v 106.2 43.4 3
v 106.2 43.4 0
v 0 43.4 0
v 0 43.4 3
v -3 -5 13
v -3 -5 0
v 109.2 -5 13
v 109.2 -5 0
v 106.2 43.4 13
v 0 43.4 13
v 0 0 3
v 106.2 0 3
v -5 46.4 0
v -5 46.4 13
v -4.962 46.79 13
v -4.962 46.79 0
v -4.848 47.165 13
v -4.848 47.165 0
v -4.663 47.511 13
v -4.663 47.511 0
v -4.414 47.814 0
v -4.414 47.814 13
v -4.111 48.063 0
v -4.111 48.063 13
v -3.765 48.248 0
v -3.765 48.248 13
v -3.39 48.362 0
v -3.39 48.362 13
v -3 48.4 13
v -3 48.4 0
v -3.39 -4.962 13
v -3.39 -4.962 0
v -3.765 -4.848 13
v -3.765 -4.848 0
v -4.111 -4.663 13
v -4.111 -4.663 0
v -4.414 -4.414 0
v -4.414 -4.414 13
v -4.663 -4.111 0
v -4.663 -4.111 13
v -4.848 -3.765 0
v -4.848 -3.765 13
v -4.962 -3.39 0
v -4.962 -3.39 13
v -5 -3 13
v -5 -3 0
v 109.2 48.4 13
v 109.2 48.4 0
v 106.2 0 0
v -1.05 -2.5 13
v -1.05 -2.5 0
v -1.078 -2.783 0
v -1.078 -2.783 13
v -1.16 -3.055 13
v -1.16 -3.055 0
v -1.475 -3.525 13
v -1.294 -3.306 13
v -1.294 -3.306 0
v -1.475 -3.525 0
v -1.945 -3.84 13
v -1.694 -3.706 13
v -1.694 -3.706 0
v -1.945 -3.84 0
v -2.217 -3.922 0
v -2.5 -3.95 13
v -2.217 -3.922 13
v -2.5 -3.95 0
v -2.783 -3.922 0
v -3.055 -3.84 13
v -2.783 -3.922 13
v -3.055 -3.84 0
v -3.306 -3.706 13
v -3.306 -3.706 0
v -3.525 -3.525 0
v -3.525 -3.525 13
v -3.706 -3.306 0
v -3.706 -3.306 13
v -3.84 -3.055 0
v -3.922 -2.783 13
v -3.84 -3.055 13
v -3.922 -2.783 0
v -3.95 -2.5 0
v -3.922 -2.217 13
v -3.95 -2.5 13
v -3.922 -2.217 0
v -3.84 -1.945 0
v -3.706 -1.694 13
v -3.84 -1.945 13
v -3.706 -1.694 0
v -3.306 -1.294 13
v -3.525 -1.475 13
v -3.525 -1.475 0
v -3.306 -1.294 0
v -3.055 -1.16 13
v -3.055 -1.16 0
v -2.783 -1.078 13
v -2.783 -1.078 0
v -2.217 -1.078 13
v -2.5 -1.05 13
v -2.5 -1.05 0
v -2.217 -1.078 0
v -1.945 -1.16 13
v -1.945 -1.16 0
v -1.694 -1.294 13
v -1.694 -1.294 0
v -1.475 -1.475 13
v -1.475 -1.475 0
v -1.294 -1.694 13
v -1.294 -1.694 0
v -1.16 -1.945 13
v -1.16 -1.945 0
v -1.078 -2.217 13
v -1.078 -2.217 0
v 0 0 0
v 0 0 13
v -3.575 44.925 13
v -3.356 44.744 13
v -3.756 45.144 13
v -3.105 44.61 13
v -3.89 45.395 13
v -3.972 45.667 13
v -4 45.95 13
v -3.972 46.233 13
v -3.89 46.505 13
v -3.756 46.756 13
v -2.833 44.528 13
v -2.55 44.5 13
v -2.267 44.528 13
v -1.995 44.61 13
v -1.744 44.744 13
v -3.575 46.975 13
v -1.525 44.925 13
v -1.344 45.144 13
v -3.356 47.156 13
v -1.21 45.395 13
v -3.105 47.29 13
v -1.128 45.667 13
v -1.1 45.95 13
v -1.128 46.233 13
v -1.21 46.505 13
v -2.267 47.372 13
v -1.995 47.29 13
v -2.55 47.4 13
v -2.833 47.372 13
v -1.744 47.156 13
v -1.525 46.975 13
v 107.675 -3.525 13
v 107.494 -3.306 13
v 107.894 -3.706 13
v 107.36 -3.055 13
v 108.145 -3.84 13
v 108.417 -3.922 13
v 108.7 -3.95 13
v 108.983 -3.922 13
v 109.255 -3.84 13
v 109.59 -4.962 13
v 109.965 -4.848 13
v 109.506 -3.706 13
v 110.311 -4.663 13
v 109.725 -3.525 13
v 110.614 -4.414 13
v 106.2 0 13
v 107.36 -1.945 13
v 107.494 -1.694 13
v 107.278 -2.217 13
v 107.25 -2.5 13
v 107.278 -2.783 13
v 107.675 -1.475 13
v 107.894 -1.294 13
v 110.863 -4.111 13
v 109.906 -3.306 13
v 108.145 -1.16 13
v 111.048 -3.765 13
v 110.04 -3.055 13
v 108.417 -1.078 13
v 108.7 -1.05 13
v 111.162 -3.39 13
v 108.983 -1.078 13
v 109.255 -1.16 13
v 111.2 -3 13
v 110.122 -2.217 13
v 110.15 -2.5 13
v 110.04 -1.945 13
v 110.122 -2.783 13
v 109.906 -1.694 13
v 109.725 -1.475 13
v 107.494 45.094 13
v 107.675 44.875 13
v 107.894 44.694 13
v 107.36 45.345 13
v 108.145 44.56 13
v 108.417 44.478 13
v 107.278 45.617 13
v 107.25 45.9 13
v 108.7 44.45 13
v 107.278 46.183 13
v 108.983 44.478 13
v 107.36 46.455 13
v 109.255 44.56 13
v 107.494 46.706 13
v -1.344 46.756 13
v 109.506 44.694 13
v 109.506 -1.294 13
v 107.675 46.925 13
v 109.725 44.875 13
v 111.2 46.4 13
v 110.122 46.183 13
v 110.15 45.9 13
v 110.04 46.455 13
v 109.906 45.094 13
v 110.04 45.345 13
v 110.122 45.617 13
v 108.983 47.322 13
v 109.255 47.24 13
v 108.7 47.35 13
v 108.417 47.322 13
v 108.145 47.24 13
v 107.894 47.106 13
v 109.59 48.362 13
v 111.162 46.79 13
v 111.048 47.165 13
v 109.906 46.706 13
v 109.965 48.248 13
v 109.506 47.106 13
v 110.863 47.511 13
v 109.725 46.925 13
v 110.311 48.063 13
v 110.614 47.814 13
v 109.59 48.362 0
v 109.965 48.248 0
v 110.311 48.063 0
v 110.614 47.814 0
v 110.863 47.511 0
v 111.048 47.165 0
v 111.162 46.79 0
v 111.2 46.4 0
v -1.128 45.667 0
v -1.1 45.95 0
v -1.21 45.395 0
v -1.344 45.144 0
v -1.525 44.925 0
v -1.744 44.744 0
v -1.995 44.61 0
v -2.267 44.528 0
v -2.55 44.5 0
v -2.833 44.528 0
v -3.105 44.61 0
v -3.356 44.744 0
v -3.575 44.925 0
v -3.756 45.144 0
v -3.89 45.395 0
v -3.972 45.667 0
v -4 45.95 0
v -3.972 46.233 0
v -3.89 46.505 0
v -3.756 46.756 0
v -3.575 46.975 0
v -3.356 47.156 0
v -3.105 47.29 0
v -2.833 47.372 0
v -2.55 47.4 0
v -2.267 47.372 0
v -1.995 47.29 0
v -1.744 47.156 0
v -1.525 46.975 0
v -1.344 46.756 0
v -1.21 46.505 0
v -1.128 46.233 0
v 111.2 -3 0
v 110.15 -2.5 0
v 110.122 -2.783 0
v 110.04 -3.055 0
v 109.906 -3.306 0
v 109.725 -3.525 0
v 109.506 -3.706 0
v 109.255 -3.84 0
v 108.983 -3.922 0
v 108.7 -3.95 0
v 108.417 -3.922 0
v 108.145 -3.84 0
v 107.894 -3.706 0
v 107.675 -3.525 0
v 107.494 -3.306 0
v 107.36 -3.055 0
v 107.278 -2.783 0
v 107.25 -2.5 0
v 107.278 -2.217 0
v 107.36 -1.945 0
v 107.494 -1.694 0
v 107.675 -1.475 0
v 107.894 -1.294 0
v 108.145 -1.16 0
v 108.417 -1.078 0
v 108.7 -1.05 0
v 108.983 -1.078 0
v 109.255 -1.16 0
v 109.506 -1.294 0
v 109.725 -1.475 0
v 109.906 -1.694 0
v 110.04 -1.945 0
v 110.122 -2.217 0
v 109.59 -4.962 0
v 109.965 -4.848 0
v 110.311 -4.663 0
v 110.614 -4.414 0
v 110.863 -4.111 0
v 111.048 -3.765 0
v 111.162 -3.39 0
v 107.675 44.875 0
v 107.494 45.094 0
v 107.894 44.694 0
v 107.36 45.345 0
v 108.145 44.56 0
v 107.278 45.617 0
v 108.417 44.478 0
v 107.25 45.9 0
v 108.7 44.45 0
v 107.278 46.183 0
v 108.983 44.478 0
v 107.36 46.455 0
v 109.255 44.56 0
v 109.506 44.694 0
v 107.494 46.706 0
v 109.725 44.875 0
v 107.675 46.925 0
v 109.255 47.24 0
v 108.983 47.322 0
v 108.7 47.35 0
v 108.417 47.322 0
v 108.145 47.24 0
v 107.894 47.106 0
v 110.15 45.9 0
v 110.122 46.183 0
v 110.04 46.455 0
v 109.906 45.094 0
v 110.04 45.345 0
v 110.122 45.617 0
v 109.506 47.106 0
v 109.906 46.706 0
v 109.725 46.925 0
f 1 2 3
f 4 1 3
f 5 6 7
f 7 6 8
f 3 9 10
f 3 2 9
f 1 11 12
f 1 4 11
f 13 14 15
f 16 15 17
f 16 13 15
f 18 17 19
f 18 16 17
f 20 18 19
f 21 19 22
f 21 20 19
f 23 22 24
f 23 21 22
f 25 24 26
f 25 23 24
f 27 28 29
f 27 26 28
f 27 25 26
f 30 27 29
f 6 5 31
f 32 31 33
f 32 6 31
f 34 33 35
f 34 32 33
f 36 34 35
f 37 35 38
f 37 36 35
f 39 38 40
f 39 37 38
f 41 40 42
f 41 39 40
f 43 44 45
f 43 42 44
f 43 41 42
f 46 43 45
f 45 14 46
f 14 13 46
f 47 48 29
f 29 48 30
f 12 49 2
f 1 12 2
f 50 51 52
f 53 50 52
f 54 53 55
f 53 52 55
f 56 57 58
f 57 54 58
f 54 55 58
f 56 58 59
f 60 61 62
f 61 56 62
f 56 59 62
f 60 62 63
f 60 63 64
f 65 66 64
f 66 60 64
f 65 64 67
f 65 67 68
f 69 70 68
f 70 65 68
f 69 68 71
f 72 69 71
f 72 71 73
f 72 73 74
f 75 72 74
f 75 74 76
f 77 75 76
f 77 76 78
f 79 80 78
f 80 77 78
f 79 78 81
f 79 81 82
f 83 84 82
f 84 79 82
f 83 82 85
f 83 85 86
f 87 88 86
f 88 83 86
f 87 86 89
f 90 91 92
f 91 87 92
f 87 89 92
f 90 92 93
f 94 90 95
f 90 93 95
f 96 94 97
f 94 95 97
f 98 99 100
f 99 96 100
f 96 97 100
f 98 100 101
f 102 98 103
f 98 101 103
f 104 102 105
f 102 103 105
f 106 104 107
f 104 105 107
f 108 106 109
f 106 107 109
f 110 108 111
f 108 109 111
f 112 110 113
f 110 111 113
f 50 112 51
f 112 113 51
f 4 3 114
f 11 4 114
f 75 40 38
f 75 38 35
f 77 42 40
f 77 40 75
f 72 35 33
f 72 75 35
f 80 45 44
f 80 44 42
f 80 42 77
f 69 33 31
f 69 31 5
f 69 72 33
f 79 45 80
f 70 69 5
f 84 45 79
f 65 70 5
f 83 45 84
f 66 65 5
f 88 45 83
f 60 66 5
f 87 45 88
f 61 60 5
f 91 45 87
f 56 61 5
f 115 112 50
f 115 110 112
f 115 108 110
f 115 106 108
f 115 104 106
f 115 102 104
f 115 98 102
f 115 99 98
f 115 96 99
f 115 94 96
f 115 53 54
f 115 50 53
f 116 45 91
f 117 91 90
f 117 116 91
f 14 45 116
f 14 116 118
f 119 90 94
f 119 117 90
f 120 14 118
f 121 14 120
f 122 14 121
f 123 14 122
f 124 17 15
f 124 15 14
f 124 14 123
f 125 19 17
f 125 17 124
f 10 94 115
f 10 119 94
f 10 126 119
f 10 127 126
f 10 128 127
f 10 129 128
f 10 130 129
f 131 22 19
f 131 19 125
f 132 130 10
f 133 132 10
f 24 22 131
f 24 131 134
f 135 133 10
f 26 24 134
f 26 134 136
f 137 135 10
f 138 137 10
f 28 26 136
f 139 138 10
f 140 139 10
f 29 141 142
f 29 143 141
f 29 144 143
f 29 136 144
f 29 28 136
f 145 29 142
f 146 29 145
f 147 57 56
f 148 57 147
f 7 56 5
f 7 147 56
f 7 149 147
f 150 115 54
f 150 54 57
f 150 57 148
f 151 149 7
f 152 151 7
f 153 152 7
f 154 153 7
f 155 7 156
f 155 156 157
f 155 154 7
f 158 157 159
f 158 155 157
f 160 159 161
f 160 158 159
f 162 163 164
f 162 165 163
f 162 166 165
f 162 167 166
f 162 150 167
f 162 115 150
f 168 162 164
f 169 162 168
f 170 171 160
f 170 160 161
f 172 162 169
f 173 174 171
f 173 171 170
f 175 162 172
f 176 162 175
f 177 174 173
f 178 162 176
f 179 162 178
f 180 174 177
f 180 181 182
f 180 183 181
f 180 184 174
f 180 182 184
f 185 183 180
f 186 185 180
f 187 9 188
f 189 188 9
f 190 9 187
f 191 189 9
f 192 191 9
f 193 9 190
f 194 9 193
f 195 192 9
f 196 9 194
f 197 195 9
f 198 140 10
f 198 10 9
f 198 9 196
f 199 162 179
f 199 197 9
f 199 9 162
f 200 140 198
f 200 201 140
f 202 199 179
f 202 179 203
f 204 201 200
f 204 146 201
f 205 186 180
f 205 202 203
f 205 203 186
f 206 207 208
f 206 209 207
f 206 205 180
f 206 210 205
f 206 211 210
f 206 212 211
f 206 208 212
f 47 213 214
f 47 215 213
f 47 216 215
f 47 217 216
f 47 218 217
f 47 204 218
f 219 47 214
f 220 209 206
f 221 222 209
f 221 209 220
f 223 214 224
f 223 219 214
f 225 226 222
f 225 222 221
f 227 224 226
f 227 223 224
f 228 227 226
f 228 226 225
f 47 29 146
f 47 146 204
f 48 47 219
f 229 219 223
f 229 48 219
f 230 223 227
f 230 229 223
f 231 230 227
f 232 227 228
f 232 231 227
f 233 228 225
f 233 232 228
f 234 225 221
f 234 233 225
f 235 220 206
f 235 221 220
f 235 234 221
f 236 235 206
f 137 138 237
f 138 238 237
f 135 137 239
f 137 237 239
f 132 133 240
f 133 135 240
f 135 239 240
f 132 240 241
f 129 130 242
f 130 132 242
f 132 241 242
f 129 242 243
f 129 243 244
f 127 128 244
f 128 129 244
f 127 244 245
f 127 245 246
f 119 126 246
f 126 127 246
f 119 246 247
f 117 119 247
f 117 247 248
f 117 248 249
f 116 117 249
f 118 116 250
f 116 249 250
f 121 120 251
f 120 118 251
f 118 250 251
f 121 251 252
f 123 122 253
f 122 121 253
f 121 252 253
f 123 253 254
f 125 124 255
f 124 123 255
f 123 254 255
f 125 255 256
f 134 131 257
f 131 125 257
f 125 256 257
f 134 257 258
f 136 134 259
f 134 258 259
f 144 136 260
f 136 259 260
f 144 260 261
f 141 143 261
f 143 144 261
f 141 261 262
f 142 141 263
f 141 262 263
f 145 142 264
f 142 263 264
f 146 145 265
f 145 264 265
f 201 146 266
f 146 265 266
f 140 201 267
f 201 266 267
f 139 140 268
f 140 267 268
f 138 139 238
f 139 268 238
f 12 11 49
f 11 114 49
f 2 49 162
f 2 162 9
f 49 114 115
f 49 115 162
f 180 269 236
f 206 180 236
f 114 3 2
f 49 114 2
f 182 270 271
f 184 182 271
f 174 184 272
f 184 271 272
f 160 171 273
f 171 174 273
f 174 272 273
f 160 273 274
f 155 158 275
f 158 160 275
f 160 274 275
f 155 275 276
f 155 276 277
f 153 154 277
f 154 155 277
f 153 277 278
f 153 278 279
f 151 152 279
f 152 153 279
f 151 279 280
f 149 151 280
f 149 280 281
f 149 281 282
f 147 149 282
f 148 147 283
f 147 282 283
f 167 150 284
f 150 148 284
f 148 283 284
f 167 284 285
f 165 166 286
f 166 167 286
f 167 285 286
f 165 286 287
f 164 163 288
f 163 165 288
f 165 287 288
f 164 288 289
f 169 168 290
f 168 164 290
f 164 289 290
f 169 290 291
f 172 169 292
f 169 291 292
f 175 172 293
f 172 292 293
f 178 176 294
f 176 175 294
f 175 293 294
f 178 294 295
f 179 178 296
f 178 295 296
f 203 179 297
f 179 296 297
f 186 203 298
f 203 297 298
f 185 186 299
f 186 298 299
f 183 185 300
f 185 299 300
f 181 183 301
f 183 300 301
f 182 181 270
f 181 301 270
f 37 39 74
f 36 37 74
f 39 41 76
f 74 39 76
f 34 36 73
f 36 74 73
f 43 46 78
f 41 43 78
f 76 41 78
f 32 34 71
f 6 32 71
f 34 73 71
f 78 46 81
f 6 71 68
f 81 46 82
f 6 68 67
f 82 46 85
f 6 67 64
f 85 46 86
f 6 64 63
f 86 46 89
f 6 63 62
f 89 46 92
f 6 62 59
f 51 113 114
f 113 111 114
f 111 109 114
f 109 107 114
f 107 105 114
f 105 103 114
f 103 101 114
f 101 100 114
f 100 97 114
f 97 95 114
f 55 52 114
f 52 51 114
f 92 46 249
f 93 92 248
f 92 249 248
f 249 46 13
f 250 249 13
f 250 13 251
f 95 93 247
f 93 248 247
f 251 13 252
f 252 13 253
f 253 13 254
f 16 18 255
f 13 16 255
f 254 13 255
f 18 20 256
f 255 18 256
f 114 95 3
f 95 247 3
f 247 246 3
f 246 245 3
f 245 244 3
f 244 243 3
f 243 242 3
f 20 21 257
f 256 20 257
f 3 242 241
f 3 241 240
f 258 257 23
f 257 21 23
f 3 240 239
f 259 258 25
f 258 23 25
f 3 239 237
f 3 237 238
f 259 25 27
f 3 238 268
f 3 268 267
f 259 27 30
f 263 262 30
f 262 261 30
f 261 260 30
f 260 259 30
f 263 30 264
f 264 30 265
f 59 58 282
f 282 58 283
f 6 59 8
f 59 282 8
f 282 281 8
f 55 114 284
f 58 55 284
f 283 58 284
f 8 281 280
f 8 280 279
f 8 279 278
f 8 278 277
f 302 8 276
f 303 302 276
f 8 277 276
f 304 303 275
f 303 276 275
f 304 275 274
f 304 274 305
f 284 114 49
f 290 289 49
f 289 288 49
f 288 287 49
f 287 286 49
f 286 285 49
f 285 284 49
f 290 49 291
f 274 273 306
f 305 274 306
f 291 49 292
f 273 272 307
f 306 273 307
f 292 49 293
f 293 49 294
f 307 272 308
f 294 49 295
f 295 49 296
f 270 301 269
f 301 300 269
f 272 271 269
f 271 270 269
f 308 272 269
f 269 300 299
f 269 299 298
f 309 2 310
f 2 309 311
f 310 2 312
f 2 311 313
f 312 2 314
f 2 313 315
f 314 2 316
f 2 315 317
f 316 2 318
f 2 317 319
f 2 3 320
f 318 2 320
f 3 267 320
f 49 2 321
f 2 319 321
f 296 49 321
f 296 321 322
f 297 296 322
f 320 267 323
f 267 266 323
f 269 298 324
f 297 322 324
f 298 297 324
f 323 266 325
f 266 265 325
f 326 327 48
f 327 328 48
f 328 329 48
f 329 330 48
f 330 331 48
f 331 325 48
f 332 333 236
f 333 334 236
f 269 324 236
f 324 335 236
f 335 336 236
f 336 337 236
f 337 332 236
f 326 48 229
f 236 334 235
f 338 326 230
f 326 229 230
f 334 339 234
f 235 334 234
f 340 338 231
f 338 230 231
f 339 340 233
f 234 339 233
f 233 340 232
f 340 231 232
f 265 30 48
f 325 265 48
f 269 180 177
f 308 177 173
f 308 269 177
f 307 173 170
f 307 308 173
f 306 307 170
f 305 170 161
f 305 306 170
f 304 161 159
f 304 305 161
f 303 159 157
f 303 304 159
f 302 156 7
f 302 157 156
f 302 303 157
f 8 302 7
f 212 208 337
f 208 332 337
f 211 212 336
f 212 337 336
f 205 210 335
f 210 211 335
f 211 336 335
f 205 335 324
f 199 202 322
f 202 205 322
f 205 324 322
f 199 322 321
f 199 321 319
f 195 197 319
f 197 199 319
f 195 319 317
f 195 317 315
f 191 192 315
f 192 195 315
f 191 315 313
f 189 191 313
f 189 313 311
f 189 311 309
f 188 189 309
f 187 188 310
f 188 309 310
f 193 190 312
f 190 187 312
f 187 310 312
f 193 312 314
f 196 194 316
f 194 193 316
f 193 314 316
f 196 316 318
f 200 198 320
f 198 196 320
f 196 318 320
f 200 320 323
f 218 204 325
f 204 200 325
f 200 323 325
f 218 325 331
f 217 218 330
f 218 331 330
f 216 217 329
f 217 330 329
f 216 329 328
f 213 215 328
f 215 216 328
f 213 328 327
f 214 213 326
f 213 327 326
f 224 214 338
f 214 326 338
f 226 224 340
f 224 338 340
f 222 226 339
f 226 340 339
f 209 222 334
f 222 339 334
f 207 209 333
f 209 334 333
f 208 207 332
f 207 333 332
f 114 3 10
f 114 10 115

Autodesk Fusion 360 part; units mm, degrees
sketch "Sketch1" plane through (0, 0, 0) normal (0, 0, 1) x (1, 0, 0)
  line L0 (0, 0) -> (106.2, 0)
  line L1 (106.2, 0) -> (106.2, 43.4)
  line L2 (106.2, 43.4) -> (0, 43.4)
  line L3 (0, 43.4) -> (0, 0)
  line L4 (-3, -5) -> (109.2, -5)
  line L5 (111.2, -3) -> (111.2, 46.4)
  line L6 (109.2, 48.4) -> (-3, 48.4)
  line L7 (-5, 46.4) -> (-5, -3)
  circle A0 centre (-2.55, 45.95) radius 1.45
  circle A1 centre (108.7, 45.9) radius 1.45
  arc A2 (-3, 48.4) -> (-5, 46.4) centre (-3, 46.4) ccw
  arc A3 (111.2, 46.4) -> (109.2, 48.4) centre (109.2, 46.4) ccw
  circle A4 centre (108.7, -2.5) radius 1.45
  arc A5 (109.2, -5) -> (111.2, -3) centre (109.2, -3) ccw
  line L8 (0, -5) -> (-0.4432, -4.5568) construction
  circle A6 centre (-2.5, -2.5) radius 1.45
  arc A7 (-5, -3) -> (-3, -5) centre (-3, -3) ccw
  dimension "d4" = 2.9
  dimension "d5" = 2.9
  dimension "d6" = 2
  dimension "d7" = 2
  dimension "d8" = 2.9
  dimension "d9" = 2
  dimension "d10" = 2.9
  dimension "d11" = 2
extrude "Extrude1" add sketch "Sketch1" along normal blind 13 makes body 1
extrude "Extrude2" add sketch "Sketch1" along normal blind 3 separate body contours L0 L1 L2 L3 makes body 2
sketch "plate-2024-10-21T20_29_41.544Z" plane through (0, 0, 3) normal (0, 0, 1) x (1, 0, 0)
  line L0 (8.4683, -47.9448) -> (21.4683, -47.9448)
  line L1 (8.4683, -61.9448) -> (21.4683, -61.9448)
  line L2 (7.9683, -48.4448) -> (7.9683, -61.4448)
  line L3 (21.9683, -48.4448) -> (21.9683, -61.4448)
  arc A0 (8.4683, -47.9448) -> (7.9683, -48.4448) centre (8.4683, -48.4448) ccw
  arc A1 (21.9683, -48.4448) -> (21.4683, -47.9448) centre (21.4683, -48.4448) ccw
  arc A2 (7.9683, -61.4448) -> (8.4683, -61.9448) centre (8.4683, -61.4448) ccw
  arc A3 (21.4683, -61.9448) -> (21.9683, -61.4448) centre (21.4683, -61.4448) ccw
  line L4 (27.5183, -47.9448) -> (40.5183, -47.9448)
  line L5 (27.5183, -61.9448) -> (40.5183, -61.9448)
  line L6 (27.0183, -48.4448) -> (27.0183, -61.4448)
  line L7 (41.0183, -48.4448) -> (41.0183, -61.4448)
  arc A4 (27.5183, -47.9448) -> (27.0183, -48.4448) centre (27.5183, -48.4448) ccw
  arc A5 (41.0183, -48.4448) -> (40.5183, -47.9448) centre (40.5183, -48.4448) ccw
  arc A6 (27.0183, -61.4448) -> (27.5183, -61.9448) centre (27.5183, -61.4448) ccw
  arc A7 (40.5183, -61.9448) -> (41.0183, -61.4448) centre (40.5183, -61.4448) ccw
  line L8 (46.5683, -47.9448) -> (59.5683, -47.9448)
  line L9 (46.5683, -61.9448) -> (59.5683, -61.9448)
  line L10 (46.0683, -48.4448) -> (46.0683, -61.4448)
  line L11 (60.0683, -48.4448) -> (60.0683, -61.4448)
  arc A8 (46.5683, -47.9448) -> (46.0683, -48.4448) centre (46.5683, -48.4448) ccw
  arc A9 (60.0683, -48.4448) -> (59.5683, -47.9448) centre (59.5683, -48.4448) ccw
  arc A10 (46.0683, -61.4448) -> (46.5683, -61.9448) centre (46.5683, -61.4448) ccw
  arc A11 (59.5683, -61.9448) -> (60.0683, -61.4448) centre (59.5683, -61.4448) ccw
  line L12 (8.4683, -66.9948) -> (21.4683, -66.9948)
  line L13 (8.4683, -80.9948) -> (21.4683, -80.9948)
  line L14 (7.9683, -67.4948) -> (7.9683, -80.4948)
  line L15 (21.9683, -67.4948) -> (21.9683, -80.4948)
  arc A12 (8.4683, -66.9948) -> (7.9683, -67.4948) centre (8.4683, -67.4948) ccw
  arc A13 (21.9683, -67.4948) -> (21.4683, -66.9948) centre (21.4683, -67.4948) ccw
  arc A14 (7.9683, -80.4948) -> (8.4683, -80.9948) centre (8.4683, -80.4948) ccw
  arc A15 (21.4683, -80.9948) -> (21.9683, -80.4948) centre (21.4683, -80.4948) ccw
  line L16 (27.5183, -66.9948) -> (40.5183, -66.9948)
  line L17 (27.5183, -80.9948) -> (40.5183, -80.9948)
  line L18 (27.0183, -67.4948) -> (27.0183, -80.4948)
  line L19 (41.0183, -67.4948) -> (41.0183, -80.4948)
  arc A16 (27.5183, -66.9948) -> (27.0183, -67.4948) centre (27.5183, -67.4948) ccw
  arc A17 (41.0183, -67.4948) -> (40.5183, -66.9948) centre (40.5183, -67.4948) ccw
  arc A18 (27.0183, -80.4948) -> (27.5183, -80.9948) centre (27.5183, -80.4948) ccw
  arc A19 (40.5183, -80.9948) -> (41.0183, -80.4948) centre (40.5183, -80.4948) ccw
  line L20 (46.5683, -66.9948) -> (59.5683, -66.9948)
  line L21 (46.5683, -80.9948) -> (59.5683, -80.9948)
  line L22 (46.0683, -67.4948) -> (46.0683, -80.4948)
  line L23 (60.0683, -67.4948) -> (60.0683, -80.4948)
  arc A20 (46.5683, -66.9948) -> (46.0683, -67.4948) centre (46.5683, -67.4948) ccw
  arc A21 (60.0683, -67.4948) -> (59.5683, -66.9948) centre (59.5683, -67.4948) ccw
  arc A22 (46.0683, -80.4948) -> (46.5683, -80.9948) centre (46.5683, -80.4948) ccw
  arc A23 (59.5683, -80.9948) -> (60.0683, -80.4948) centre (59.5683, -80.4948) ccw
  line L24 (65.6183, -66.9948) -> (78.6183, -66.9948)
  line L25 (65.6183, -80.9948) -> (78.6183, -80.9948)
  line L26 (65.1183, -67.4948) -> (65.1183, -80.4948)
  line L27 (79.1183, -67.4948) -> (79.1183, -80.4948)
  arc A24 (65.6183, -66.9948) -> (65.1183, -67.4948) centre (65.6183, -67.4948) ccw
  arc A25 (79.1183, -67.4948) -> (78.6183, -66.9948) centre (78.6183, -67.4948) ccw
  arc A26 (65.1183, -80.4948) -> (65.6183, -80.9948) centre (65.6183, -80.4948) ccw
  arc A27 (78.6183, -80.9948) -> (79.1183, -80.4948) centre (78.6183, -80.4948) ccw
  line L28 (5.4433, -83.5198) -> (81.6433, -83.5198)
  line L29 (5.4433, -45.4198) -> (81.6433, -45.4198)
  line L30 (5.4433, -83.5198) -> (5.4433, -45.4198)
  line L31 (81.6433, -83.5198) -> (81.6433, -45.4198)
  dimension "d16" = 38.1
